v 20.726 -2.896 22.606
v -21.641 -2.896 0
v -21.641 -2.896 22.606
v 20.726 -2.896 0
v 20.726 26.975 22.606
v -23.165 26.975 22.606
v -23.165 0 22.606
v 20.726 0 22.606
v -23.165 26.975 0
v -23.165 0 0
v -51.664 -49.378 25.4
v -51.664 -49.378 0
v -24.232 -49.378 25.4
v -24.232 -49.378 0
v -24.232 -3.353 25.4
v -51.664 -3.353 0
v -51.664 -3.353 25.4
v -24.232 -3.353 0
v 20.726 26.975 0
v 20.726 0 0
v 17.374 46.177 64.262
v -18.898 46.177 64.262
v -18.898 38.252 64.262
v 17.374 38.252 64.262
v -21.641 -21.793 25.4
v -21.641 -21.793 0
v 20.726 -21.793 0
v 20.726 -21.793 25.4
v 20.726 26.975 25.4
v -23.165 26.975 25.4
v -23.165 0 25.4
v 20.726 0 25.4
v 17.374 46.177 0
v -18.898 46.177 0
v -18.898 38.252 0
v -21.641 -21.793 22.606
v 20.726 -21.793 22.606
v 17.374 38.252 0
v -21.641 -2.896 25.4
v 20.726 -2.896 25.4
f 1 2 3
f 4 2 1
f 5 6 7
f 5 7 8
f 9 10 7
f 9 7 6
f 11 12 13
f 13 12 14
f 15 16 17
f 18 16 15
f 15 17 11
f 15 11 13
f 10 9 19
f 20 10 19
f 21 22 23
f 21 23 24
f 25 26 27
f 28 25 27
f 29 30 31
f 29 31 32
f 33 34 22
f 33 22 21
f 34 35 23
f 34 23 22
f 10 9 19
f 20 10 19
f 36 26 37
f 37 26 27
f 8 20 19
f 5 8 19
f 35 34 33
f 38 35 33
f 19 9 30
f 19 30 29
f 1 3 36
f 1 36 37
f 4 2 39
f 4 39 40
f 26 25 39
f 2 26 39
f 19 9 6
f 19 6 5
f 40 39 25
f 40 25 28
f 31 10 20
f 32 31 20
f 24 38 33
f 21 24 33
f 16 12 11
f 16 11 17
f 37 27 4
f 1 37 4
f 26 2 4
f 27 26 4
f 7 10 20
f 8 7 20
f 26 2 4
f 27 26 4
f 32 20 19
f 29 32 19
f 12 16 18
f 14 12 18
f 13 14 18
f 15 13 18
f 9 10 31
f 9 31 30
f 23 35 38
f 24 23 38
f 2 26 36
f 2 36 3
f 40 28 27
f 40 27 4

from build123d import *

# Parameters (mm, degrees)
F0_W     = 43.891202
F0_H     = 26.974801
F0_W_2   = 42.367201
F0_H_2   = 18.8976
F1_DEPTH = 25.4
F2_DEPTH = 22.606
F3_W     = 36.271201
F3_H     = 7.924799
F4_DEPTH = 64.262
F5_W     = 27.432
F5_H     = 46.0248
F6_DEPTH = 25.4


with BuildPart() as f1:
    # F0 (on Top) → F1 (new body)
    with BuildSketch(Plane.XY):
        with Locations((-1.2192, 13.4874)):
            Rectangle(F0_W, F0_H)
        with Locations((-0.457199, -12.3444)):
            Rectangle(F0_W_2, F0_H_2)
    extrude(amount=F1_DEPTH)


with BuildPart() as f2:
    # F0 (on Top) → F2 (new body)
    with BuildSketch(Plane.XY):
        with Locations((-1.2192, 13.4874)):
            Rectangle(F0_W, F0_H)
        with Locations((-0.457199, -12.3444)):
            Rectangle(F0_W_2, F0_H_2)
    extrude(amount=F2_DEPTH)


with BuildPart() as f4:
    # F3 (on Top) → F4 (new body)
    with BuildSketch(Plane.XY):
        with Locations((-0.762002, 42.214798)):
            Rectangle(F3_W, F3_H)
    extrude(amount=F4_DEPTH)


with BuildPart() as f6:
    # F5 (on Top) → F6 (new body)
    with BuildSketch(Plane.XY):
        with Locations((-37.9476, -26.365202)):
            Rectangle(F5_W, F5_H)
    extrude(amount=F6_DEPTH)


solid = Compound([f1.part, f2.part, f4.part, f6.part])
